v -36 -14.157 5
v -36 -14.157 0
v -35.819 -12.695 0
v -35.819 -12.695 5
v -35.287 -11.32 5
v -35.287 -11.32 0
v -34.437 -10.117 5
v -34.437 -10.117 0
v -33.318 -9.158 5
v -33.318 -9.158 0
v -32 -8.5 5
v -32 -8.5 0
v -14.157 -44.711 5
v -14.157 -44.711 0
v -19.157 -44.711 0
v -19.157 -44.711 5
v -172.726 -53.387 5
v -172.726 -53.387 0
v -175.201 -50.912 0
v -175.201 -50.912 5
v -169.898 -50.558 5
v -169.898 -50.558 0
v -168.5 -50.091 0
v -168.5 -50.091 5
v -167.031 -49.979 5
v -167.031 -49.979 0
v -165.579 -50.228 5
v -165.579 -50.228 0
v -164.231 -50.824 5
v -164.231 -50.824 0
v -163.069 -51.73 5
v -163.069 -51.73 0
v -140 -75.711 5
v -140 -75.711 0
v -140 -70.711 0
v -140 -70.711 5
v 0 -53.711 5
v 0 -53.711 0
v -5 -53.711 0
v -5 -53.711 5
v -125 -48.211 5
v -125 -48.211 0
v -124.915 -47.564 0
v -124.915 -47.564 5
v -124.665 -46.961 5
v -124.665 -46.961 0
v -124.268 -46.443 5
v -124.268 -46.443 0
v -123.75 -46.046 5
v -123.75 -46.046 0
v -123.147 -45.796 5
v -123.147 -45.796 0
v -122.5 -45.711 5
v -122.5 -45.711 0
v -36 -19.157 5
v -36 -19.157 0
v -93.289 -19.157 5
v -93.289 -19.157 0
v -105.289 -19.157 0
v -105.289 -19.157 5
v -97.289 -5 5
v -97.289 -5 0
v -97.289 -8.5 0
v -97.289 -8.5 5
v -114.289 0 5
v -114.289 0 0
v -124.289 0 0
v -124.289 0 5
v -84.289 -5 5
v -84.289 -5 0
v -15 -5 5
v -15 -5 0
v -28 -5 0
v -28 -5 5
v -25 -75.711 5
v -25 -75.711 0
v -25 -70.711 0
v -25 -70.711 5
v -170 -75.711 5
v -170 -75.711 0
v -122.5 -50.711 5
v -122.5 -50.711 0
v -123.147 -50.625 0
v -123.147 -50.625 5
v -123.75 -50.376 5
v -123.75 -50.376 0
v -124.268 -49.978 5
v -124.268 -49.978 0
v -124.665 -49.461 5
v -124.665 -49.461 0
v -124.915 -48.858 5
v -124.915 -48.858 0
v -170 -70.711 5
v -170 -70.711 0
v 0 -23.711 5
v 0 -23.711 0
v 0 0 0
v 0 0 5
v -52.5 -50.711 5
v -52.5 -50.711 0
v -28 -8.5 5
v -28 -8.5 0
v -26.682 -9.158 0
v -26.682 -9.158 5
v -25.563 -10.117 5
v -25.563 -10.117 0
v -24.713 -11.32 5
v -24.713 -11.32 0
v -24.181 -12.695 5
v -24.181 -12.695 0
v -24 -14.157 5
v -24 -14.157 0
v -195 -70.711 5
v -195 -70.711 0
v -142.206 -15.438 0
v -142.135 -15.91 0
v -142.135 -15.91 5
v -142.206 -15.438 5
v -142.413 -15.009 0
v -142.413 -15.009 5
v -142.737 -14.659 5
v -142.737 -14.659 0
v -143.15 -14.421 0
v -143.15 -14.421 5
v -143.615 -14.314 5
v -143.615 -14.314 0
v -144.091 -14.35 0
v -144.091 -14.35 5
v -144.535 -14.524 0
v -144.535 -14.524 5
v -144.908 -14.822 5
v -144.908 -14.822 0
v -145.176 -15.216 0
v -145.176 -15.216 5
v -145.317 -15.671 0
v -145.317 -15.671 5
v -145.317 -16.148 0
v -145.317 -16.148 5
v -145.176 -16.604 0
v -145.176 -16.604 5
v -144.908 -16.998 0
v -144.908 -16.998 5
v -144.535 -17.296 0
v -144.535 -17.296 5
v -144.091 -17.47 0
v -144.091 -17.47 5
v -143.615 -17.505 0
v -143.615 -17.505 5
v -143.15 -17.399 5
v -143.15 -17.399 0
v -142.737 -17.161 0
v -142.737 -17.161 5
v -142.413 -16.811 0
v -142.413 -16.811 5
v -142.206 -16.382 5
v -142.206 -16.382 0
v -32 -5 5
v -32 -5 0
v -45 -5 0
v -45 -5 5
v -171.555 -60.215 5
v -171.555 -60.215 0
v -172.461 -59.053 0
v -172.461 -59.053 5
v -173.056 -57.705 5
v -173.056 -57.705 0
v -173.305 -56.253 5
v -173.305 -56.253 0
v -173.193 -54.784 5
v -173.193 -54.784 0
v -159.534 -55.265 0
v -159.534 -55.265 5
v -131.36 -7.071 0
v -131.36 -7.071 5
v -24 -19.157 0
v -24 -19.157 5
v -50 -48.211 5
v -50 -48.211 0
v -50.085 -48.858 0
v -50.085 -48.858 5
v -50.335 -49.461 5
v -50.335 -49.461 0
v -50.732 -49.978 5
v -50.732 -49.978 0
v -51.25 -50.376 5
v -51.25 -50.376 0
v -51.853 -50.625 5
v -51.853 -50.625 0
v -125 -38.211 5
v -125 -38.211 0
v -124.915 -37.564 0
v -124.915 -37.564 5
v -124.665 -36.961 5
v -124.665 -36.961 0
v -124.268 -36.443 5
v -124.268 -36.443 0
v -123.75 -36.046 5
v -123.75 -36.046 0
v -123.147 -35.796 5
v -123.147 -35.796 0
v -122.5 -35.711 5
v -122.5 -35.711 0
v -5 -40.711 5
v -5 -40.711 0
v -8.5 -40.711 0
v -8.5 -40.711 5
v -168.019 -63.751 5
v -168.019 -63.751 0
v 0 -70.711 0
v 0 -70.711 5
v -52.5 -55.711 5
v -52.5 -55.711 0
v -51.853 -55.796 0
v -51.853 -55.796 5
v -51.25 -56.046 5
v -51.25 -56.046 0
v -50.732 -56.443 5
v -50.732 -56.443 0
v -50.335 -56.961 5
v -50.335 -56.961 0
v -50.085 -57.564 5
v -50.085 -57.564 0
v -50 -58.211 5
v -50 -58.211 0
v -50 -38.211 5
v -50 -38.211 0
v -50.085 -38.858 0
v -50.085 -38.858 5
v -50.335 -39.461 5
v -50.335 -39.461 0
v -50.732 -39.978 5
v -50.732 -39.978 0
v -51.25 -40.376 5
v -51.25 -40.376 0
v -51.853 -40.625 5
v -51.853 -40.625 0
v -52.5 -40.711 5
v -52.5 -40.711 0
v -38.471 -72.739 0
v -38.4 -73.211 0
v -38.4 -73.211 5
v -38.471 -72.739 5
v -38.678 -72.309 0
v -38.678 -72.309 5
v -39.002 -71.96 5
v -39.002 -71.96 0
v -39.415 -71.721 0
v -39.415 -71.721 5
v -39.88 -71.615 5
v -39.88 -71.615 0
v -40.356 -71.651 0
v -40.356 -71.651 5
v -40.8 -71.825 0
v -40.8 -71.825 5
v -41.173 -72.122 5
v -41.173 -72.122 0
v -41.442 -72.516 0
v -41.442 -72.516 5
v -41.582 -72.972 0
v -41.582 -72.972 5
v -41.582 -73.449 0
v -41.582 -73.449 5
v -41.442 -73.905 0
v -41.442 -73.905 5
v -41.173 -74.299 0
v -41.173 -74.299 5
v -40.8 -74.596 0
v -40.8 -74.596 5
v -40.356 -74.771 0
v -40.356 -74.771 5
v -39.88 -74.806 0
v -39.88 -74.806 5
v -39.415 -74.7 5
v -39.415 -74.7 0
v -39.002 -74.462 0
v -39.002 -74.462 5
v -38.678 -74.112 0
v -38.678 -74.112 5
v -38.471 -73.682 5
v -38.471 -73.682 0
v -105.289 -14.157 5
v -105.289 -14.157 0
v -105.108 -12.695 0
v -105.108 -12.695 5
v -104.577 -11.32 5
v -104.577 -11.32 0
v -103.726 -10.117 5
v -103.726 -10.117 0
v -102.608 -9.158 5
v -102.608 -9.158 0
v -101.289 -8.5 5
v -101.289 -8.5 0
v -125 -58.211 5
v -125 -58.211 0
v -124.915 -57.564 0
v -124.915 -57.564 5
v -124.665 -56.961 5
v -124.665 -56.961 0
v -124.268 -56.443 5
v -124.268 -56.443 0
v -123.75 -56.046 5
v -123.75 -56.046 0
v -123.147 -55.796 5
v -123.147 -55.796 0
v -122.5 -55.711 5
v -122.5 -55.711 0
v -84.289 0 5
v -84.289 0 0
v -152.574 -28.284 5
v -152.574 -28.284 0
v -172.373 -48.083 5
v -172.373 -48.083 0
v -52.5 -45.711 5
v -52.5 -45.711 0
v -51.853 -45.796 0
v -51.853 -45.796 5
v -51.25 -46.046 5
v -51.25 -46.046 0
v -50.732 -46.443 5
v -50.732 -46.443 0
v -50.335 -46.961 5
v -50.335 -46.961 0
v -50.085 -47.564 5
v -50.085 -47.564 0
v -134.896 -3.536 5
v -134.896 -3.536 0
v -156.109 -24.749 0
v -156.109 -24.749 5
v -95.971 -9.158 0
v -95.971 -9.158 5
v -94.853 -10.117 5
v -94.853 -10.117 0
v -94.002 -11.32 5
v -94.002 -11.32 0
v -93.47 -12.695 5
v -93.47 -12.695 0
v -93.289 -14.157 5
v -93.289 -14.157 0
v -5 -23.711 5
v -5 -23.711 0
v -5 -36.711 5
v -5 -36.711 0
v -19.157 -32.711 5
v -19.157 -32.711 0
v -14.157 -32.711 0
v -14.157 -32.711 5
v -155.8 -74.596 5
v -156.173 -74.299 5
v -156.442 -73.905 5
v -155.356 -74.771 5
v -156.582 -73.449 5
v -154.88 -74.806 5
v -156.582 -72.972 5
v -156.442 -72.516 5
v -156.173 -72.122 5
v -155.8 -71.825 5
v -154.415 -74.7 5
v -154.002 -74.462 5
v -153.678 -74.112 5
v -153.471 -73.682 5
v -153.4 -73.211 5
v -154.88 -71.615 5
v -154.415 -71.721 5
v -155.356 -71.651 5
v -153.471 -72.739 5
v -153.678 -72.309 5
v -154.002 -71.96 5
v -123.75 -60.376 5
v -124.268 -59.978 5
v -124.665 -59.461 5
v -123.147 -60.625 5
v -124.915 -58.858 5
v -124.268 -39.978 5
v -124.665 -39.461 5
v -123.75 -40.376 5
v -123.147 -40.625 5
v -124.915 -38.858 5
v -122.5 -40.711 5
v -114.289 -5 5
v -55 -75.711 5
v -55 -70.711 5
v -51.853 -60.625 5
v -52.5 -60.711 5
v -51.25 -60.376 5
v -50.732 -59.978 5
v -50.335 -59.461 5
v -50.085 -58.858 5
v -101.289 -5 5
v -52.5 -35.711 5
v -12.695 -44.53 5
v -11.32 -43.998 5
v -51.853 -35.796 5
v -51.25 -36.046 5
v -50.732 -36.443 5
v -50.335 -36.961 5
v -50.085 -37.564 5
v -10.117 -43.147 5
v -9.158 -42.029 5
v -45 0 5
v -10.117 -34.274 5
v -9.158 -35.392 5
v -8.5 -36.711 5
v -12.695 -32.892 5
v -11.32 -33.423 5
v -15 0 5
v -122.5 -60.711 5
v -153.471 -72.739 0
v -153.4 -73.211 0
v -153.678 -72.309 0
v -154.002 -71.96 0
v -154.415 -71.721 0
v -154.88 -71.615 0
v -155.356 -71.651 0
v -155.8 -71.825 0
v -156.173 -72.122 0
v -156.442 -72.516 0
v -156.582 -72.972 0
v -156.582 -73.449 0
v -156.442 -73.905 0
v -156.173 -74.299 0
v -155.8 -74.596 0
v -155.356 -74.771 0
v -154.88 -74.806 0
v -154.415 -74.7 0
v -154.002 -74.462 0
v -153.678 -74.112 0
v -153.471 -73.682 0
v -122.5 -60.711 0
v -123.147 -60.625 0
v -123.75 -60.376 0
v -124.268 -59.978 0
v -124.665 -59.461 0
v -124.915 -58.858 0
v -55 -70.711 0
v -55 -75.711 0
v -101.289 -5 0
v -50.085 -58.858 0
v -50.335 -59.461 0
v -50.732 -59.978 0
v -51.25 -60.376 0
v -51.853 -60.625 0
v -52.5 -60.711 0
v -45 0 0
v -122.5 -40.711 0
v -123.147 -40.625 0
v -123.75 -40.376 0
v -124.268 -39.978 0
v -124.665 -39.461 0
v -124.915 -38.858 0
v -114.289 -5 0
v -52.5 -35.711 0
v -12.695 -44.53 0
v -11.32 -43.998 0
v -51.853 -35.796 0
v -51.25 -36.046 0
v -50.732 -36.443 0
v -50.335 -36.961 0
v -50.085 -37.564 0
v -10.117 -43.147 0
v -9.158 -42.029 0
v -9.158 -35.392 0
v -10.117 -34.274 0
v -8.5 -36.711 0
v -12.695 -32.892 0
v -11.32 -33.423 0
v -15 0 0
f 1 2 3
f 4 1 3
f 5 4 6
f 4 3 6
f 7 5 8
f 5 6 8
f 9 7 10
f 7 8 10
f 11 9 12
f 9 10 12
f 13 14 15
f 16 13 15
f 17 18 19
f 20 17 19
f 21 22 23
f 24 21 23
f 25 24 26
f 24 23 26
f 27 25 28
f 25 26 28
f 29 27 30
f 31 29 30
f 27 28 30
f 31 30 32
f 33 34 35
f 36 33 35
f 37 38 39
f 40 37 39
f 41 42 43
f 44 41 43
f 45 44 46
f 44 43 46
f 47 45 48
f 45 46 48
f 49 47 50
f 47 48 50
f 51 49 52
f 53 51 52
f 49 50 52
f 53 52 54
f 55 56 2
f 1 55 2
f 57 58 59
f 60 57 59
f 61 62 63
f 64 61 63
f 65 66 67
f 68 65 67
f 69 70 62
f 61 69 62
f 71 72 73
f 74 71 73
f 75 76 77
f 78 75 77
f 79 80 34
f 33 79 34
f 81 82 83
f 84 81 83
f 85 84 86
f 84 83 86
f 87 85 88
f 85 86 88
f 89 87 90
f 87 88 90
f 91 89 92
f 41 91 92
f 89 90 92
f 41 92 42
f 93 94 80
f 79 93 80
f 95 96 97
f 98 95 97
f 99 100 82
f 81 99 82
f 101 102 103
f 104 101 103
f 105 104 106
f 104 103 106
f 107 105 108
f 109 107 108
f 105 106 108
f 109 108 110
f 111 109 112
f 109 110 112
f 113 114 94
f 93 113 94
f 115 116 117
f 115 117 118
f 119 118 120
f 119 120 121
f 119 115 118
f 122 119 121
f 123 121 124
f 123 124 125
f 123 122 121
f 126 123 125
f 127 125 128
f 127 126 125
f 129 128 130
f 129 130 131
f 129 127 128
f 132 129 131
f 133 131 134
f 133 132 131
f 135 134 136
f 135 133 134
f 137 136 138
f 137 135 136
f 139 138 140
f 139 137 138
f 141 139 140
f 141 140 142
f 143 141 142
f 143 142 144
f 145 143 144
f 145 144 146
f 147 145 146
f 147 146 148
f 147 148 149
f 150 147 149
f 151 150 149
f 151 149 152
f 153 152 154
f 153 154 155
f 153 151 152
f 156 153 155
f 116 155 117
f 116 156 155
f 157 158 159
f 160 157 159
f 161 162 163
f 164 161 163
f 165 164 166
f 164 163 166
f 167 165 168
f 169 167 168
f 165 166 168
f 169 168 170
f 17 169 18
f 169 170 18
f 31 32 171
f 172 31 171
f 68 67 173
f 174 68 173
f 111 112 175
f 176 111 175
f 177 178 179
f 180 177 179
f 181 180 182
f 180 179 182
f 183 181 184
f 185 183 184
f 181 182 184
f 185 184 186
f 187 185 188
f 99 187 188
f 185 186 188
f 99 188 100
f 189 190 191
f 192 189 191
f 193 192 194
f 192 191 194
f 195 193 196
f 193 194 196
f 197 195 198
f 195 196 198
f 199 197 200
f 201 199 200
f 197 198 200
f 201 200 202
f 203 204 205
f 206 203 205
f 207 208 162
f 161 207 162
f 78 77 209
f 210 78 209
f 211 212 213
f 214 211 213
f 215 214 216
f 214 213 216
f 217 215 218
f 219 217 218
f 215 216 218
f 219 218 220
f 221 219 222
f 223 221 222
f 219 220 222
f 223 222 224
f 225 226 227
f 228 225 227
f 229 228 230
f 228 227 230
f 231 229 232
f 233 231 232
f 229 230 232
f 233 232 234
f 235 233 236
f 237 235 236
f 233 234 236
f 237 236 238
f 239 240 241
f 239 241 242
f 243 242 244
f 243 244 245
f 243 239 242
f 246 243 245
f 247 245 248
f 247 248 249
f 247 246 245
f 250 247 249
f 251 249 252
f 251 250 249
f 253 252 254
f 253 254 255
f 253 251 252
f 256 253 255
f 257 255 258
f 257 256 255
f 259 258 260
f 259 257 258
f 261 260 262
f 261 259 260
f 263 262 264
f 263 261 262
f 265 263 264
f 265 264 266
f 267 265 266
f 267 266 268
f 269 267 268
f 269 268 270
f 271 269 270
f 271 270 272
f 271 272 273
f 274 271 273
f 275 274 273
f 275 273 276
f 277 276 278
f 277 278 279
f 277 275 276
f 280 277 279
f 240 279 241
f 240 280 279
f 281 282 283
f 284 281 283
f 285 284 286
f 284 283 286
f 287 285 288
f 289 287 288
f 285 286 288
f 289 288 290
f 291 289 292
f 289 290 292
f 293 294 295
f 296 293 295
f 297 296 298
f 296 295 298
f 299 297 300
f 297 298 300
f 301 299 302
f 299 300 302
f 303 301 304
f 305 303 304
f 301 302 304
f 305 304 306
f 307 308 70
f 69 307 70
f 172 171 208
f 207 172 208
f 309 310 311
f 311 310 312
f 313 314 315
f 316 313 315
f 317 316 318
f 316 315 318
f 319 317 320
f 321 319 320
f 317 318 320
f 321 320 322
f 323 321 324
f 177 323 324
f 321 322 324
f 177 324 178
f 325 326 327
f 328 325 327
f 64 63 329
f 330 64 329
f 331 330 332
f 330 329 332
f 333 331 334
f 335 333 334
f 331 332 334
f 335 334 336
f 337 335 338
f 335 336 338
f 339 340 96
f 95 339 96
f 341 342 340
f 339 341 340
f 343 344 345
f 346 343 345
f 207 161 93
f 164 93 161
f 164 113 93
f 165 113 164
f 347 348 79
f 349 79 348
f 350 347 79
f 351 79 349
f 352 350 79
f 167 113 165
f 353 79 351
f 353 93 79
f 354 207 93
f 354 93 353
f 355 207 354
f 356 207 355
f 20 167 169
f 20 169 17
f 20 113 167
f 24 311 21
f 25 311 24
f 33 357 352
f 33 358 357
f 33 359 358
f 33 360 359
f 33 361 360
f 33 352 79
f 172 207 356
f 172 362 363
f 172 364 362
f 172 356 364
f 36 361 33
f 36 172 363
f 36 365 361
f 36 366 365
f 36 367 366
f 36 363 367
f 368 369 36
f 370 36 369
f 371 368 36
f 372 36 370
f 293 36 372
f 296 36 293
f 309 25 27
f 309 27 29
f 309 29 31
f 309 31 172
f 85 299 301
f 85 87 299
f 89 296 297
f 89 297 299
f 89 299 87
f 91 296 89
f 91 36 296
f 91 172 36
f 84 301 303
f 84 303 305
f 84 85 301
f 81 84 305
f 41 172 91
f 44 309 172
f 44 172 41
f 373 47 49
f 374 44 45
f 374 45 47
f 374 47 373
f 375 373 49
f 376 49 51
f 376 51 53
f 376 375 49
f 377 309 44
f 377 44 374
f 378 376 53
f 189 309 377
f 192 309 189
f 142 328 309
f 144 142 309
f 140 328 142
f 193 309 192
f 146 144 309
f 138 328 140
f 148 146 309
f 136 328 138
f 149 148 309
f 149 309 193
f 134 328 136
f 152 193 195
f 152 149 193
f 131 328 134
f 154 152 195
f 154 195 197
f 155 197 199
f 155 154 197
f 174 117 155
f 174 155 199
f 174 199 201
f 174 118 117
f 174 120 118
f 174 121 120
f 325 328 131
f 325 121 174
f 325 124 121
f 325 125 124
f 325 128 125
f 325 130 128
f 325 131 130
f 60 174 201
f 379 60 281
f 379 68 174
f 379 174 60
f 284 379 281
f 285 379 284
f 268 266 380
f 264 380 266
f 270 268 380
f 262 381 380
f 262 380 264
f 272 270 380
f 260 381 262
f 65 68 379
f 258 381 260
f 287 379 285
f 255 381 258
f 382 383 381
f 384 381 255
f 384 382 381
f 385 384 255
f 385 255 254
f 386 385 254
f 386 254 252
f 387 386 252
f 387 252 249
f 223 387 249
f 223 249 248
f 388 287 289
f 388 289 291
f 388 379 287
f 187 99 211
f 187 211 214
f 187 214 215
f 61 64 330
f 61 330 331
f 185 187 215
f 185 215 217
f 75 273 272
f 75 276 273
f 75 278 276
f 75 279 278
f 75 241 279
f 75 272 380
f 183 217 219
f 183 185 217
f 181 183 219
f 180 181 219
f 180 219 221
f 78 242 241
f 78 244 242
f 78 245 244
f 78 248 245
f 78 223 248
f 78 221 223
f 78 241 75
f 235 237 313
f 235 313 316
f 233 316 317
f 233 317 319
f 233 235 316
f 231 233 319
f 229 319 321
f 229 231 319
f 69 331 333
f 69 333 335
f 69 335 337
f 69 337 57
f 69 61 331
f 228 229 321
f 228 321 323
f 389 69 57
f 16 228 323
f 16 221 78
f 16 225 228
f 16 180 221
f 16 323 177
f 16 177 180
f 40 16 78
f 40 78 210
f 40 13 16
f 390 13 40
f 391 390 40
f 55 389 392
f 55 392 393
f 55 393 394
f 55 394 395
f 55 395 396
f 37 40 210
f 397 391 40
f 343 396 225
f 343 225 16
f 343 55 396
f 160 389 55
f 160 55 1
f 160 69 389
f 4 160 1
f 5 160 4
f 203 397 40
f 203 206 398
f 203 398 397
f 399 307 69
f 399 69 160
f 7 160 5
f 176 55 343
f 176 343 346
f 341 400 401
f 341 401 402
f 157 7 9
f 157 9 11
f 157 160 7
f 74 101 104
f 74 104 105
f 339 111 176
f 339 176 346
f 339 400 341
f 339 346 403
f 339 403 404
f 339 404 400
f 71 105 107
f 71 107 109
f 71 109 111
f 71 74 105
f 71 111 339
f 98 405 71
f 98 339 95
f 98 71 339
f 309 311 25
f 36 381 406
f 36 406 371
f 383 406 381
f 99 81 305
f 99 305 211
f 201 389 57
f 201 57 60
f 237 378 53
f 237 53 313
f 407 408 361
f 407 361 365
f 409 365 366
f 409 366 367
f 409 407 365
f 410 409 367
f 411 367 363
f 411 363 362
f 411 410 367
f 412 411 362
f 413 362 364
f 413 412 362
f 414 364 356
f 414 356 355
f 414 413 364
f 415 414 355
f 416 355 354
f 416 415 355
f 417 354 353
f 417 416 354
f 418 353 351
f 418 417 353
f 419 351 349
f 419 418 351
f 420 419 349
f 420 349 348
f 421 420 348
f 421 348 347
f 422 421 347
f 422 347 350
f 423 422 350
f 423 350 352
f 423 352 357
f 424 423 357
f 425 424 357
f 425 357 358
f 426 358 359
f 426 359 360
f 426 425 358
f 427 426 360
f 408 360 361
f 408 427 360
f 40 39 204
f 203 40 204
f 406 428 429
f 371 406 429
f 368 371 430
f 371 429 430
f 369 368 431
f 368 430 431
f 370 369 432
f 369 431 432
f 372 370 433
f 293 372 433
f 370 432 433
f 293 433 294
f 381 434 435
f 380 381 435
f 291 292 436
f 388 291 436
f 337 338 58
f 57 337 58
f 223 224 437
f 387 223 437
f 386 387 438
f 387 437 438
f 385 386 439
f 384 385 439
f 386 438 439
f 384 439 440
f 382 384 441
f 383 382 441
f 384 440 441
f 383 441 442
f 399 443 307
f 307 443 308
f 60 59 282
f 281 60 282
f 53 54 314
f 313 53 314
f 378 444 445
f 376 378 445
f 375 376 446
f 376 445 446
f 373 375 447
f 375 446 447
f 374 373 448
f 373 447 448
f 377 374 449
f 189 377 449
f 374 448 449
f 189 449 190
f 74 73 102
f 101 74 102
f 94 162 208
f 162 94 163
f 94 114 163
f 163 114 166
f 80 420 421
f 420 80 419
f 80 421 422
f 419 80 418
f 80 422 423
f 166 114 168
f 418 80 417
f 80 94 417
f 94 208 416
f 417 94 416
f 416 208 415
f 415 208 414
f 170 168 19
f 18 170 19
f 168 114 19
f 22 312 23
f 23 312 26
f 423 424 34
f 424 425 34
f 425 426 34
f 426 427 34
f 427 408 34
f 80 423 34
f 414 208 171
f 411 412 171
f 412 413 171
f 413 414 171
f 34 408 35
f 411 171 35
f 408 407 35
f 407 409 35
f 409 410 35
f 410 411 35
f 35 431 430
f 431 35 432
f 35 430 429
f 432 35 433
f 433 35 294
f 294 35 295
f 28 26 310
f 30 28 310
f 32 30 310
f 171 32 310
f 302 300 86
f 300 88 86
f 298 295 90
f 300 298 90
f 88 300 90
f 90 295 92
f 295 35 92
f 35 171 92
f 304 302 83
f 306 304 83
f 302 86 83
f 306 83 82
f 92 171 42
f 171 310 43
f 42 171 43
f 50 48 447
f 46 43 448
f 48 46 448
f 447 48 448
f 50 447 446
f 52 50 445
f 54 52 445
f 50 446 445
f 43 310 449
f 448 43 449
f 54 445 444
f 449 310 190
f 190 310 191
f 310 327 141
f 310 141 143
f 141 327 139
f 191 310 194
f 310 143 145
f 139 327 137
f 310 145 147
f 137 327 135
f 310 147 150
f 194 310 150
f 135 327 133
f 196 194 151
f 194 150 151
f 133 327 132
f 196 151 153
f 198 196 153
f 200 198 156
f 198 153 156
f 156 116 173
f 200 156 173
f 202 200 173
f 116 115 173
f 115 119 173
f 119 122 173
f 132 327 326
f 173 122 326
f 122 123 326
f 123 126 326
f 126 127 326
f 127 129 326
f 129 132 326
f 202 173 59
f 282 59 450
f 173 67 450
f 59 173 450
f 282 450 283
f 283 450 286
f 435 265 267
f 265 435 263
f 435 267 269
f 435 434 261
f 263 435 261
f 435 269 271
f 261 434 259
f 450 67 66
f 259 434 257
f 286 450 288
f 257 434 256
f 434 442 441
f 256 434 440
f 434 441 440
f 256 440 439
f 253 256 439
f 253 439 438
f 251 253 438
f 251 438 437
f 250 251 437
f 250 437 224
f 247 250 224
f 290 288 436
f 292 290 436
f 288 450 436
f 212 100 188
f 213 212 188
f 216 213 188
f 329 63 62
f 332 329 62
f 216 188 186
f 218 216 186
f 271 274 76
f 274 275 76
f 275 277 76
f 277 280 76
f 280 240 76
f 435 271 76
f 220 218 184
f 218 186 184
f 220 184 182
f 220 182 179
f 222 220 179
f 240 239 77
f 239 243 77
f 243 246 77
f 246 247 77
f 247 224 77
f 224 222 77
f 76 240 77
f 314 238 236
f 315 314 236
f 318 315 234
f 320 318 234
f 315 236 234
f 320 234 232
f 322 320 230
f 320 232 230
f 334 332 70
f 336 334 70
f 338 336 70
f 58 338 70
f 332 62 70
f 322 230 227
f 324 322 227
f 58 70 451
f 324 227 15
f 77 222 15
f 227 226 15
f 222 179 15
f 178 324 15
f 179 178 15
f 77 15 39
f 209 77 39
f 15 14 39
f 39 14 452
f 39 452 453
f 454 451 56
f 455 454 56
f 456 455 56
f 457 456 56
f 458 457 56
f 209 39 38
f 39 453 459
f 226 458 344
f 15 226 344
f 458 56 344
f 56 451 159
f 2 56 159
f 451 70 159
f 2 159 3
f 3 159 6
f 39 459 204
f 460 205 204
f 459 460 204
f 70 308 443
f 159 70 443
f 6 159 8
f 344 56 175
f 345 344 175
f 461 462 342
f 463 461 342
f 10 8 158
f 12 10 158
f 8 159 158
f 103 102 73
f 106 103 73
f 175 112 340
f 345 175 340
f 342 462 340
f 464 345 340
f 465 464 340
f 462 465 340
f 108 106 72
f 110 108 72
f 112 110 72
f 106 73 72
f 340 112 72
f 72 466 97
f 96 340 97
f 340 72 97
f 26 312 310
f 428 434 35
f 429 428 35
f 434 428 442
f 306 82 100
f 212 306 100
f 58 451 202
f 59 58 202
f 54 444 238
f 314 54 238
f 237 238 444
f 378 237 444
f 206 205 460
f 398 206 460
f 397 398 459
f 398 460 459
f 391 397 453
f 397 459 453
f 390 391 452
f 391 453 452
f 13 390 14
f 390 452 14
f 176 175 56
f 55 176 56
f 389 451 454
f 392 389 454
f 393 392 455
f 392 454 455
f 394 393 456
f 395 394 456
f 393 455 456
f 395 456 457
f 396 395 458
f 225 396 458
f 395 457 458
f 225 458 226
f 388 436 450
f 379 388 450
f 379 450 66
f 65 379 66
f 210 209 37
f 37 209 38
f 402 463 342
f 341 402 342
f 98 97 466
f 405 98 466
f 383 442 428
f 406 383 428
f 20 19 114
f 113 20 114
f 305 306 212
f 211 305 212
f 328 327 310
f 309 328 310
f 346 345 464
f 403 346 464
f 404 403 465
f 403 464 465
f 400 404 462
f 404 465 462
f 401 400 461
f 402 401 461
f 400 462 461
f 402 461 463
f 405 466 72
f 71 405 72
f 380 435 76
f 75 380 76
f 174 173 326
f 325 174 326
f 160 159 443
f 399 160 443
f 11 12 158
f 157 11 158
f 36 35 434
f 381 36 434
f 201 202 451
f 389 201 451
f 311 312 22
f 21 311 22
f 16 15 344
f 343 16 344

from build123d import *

# Parameters (mm, degrees)
F0_R     = 1.6
F1_DEPTH = 5


with BuildPart() as f1:
    # F0 (on Top) → F1 (new body)
    with BuildSketch(Plane.XY):
        with BuildLine():
            Line((0, -23.710678), (0, 0))
            Line((0, 0), (-15, 0))
            Line((-15, 0), (-15, -5))
            Line((-15, -5), (-28, -5))
            Line((-28, -5), (-28, -8.5))
            ThreePointArc((-28, -8.5), (-25.101021, -10.692753), (-24, -14.156854))
            Line((-24, -14.156854), (-24, -19.156854))
            Line((-24, -19.156854), (-36, -19.156854))
            Line((-36, -19.156854), (-36, -14.156854))
            ThreePointArc((-36, -14.156854), (-34.898979, -10.692753), (-32, -8.5))
            Line((-32, -8.5), (-32, -5))
            Line((-32, -5), (-45, -5))
            Line((-45, -5), (-45, 0))
            Line((-45, 0), (-84.289322, 0))
            Line((-84.289322, 0), (-84.289322, -5))
            Line((-84.289322, -5), (-97.289322, -5))
            Line((-97.289322, -5), (-97.289322, -8.5))
            ThreePointArc((-97.289322, -8.5), (-94.390342, -10.692753), (-93.289322, -14.156854))
            Line((-93.289322, -14.156854), (-93.289322, -19.156854))
            Line((-93.289322, -19.156854), (-105.289322, -19.156854))
            Line((-105.289322, -19.156854), (-105.289322, -14.156854))
            ThreePointArc((-105.289322, -14.156854), (-104.188301, -10.692753), (-101.289322, -8.5))
            Line((-101.289322, -8.5), (-101.289322, -5))
            Line((-101.289322, -5), (-114.289322, -5))
            Line((-114.289322, -5), (-114.289322, 0))
            Line((-114.289322, 0), (-124.289322, 0))
            Line((-124.289322, 0), (-131.36039, -7.071068))
            Line((-131.36039, -7.071068), (-134.895924, -3.535534))
            Line((-134.895924, -3.535534), (-156.109127, -24.748737))
            Line((-156.109127, -24.748737), (-152.573593, -28.284271))
            Line((-152.573593, -28.284271), (-172.372583, -48.083261))
            Line((-172.372583, -48.083261), (-169.897709, -50.558135))
            ThreePointArc((-169.897709, -50.558135), (-166.297311, -50.058757), (-163.069282, -51.729708))
            Line((-163.069282, -51.729708), (-159.533748, -55.265242))
            Line((-159.533748, -55.265242), (-168.01903, -63.750523))
            Line((-168.01903, -63.750523), (-171.554564, -60.214989))
            ThreePointArc((-171.554564, -60.214989), (-173.225514, -56.98696), (-172.726136, -53.386562))
            Line((-172.726136, -53.386562), (-175.20101, -50.911688))
            Line((-175.20101, -50.911688), (-195, -70.710678))
            Line((-195, -70.710678), (-170, -70.710678))
            Line((-170, -70.710678), (-170, -75.710678))
            Line((-170, -75.710678), (-140, -75.710678))
            Line((-140, -75.710678), (-140, -70.710678))
            Line((-140, -70.710678), (-55, -70.710678))
            Line((-55, -70.710678), (-55, -75.710678))
            Line((-55, -75.710678), (-25, -75.710678))
            Line((-25, -75.710678), (-25, -70.710678))
            Line((-25, -70.710678), (0, -70.710678))
            Line((0, -70.710678), (0, -53.710678))
            Line((0, -53.710678), (-5, -53.710678))
            Line((-5, -53.710678), (-5, -40.710678))
            Line((-5, -40.710678), (-8.5, -40.710678))
            ThreePointArc((-8.5, -40.710678), (-10.692753, -43.609658), (-14.156854, -44.710678))
            Line((-14.156854, -44.710678), (-19.156854, -44.710678))
            Line((-19.156854, -44.710678), (-19.156854, -32.710678))
            Line((-19.156854, -32.710678), (-14.156854, -32.710678))
            ThreePointArc((-14.156854, -32.710678), (-10.692753, -33.811699), (-8.5, -36.710678))
            Line((-8.5, -36.710678), (-5, -36.710678))
            Line((-5, -36.710678), (-5, -23.710678))
            Line((-5, -23.710678), (0, -23.710678))
        make_face()
        with Locations((-155, -73.210678)):
            Circle(F0_R, mode=Mode.SUBTRACT)
        with BuildLine():
            ThreePointArc((-125, -58.210678), (-124.267767, -56.442911), (-122.5, -55.710678))
            Line((-122.5, -55.710678), (-52.5, -55.710678))
            ThreePointArc((-52.5, -55.710678), (-50.732233, -56.442911), (-50, -58.210678))
            ThreePointArc((-50, -58.210678), (-50.732233, -59.978445), (-52.5, -60.710678))
            Line((-52.5, -60.710678), (-122.5, -60.710678))
            ThreePointArc((-122.5, -60.710678), (-124.267767, -59.978445), (-125, -58.210678))
        make_face(mode=Mode.SUBTRACT)
        with Locations((-40, -73.210678)):
            Circle(F0_R, mode=Mode.SUBTRACT)
        with BuildLine():
            ThreePointArc((-125, -48.210678), (-124.267767, -46.442911), (-122.5, -45.710678))
            Line((-122.5, -45.710678), (-52.5, -45.710678))
            ThreePointArc((-52.5, -45.710678), (-50.732233, -46.442911), (-50, -48.210678))
            ThreePointArc((-50, -48.210678), (-50.732233, -49.978445), (-52.5, -50.710678))
            Line((-52.5, -50.710678), (-122.5, -50.710678))
            ThreePointArc((-122.5, -50.710678), (-124.267767, -49.978445), (-125, -48.210678))
        make_face(mode=Mode.SUBTRACT)
        with BuildLine():
            ThreePointArc((-125, -38.210678), (-124.267767, -36.442911), (-122.5, -35.710678))
            Line((-122.5, -35.710678), (-52.5, -35.710678))
            ThreePointArc((-52.5, -35.710678), (-50.732233, -36.442911), (-50, -38.210678))
            ThreePointArc((-50, -38.210678), (-50.732233, -39.978445), (-52.5, -40.710678))
            Line((-52.5, -40.710678), (-122.5, -40.710678))
            ThreePointArc((-122.5, -40.710678), (-124.267767, -39.978445), (-125, -38.210678))
        make_face(mode=Mode.SUBTRACT)
        with Locations((-143.734758, -15.909903)):
            Circle(F0_R, mode=Mode.SUBTRACT)
    extrude(amount=F1_DEPTH)


solid = f1.part
